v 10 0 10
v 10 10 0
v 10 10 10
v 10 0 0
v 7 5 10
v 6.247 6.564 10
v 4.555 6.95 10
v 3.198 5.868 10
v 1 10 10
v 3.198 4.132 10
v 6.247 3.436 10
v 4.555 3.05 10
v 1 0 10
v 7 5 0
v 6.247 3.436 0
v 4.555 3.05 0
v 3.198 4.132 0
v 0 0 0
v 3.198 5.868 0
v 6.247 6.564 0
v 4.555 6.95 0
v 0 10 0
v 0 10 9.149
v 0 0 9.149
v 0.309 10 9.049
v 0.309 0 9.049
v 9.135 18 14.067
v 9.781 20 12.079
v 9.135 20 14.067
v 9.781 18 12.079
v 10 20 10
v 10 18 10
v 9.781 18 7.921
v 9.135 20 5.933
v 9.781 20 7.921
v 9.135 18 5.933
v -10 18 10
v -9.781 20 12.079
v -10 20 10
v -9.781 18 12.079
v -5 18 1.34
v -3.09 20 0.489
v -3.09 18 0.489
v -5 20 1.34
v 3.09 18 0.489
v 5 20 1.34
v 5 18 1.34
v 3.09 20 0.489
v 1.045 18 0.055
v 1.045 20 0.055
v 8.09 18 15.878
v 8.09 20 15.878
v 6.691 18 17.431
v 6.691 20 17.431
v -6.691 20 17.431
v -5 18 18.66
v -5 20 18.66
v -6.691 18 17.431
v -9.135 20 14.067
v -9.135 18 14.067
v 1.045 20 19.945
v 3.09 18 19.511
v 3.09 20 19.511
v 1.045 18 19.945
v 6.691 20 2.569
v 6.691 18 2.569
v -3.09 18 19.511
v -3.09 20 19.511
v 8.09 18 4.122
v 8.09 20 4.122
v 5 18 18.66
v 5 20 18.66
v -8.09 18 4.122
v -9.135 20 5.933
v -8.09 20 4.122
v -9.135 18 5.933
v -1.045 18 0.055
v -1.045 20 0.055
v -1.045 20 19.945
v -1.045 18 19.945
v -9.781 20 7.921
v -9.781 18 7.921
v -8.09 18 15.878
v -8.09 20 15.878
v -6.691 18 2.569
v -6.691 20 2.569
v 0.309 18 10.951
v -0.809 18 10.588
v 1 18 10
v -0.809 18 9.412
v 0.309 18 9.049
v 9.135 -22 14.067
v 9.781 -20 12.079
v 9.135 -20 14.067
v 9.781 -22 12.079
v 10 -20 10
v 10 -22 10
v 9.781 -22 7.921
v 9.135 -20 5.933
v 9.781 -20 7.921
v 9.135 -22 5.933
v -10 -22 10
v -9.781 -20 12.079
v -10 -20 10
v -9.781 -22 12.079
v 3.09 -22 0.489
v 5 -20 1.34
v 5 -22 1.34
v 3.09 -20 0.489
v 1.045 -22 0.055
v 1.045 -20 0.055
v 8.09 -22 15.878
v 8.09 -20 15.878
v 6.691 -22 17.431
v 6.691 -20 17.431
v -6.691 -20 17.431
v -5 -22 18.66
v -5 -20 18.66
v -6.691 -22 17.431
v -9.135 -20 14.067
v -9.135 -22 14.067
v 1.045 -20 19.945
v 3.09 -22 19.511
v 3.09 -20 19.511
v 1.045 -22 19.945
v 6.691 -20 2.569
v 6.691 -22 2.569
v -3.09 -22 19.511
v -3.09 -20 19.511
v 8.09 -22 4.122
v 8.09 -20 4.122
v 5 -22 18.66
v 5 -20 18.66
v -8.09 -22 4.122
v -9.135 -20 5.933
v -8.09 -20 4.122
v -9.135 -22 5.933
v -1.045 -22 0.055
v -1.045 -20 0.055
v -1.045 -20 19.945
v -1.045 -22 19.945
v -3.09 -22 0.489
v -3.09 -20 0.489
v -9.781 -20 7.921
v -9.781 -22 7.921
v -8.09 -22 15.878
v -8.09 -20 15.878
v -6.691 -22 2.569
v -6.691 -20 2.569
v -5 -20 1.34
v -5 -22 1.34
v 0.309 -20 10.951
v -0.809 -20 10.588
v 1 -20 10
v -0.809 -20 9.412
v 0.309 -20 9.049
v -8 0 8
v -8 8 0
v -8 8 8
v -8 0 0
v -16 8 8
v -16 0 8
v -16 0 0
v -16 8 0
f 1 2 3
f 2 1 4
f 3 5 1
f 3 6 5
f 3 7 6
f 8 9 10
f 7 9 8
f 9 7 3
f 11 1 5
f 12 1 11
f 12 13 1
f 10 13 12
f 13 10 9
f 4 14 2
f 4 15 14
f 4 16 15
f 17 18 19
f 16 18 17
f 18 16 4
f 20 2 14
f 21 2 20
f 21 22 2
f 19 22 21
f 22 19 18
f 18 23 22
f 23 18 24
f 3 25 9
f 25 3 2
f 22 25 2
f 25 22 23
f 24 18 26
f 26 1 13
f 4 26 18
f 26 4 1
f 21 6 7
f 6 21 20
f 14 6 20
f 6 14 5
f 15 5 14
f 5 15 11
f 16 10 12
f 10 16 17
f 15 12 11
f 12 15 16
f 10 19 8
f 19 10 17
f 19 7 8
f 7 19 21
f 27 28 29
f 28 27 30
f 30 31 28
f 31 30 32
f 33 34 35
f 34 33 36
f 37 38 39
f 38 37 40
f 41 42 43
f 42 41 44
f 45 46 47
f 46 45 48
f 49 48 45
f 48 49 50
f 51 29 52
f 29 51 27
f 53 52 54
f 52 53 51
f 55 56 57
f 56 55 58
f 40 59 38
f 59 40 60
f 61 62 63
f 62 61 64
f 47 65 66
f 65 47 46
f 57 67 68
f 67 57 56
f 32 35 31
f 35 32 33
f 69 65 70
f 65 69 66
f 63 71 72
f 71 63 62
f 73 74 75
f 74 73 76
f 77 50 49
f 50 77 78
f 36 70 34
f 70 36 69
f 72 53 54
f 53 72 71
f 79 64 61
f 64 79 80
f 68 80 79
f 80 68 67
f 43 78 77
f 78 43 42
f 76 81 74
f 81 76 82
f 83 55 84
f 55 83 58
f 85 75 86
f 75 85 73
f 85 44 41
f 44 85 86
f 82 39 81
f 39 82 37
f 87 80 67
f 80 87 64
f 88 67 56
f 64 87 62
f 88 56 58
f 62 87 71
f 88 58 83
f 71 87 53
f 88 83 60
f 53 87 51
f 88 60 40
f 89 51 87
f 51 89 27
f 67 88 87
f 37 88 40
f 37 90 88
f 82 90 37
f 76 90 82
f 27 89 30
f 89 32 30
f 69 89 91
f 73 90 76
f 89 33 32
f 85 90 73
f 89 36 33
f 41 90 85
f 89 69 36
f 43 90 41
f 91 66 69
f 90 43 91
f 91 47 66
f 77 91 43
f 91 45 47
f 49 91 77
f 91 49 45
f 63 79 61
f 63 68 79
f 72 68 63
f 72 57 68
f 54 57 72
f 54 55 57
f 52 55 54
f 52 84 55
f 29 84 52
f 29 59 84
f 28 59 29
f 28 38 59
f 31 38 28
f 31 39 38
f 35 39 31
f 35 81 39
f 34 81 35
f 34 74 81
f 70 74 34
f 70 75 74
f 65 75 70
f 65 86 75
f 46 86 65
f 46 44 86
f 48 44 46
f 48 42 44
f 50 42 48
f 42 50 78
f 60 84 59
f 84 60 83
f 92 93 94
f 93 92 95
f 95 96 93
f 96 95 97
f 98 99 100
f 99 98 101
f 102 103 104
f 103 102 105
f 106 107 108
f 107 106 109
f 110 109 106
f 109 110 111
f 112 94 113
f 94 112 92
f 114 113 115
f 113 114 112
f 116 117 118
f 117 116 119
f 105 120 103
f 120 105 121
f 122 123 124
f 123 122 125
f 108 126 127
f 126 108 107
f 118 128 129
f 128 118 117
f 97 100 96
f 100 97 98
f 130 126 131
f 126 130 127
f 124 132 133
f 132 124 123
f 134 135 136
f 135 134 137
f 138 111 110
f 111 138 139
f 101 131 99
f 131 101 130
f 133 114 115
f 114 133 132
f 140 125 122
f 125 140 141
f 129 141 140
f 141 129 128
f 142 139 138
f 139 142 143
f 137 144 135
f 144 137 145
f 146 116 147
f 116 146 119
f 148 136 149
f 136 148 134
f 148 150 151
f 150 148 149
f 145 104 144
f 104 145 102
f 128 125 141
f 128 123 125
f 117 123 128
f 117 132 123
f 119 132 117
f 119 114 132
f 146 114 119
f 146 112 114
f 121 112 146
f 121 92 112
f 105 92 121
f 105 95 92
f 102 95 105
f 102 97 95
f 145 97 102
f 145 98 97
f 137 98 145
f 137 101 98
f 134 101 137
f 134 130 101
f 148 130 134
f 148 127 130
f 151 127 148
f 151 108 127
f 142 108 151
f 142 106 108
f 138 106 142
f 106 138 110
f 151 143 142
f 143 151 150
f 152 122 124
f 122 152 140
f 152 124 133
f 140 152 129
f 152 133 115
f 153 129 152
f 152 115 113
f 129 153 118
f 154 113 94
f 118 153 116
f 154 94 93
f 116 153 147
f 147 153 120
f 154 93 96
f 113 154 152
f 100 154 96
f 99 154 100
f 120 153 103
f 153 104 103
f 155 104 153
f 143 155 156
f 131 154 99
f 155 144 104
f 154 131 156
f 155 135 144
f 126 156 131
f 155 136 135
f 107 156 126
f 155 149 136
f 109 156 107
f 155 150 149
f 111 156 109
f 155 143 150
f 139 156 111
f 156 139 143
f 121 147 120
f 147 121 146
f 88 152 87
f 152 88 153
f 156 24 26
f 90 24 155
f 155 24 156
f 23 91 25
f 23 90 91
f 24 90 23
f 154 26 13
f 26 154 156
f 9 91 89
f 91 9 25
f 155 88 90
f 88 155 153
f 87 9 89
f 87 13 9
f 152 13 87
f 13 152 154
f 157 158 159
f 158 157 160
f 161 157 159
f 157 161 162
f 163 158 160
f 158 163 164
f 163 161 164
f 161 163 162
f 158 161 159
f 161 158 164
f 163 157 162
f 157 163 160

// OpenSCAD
/* Movement */

/*
translate([-20, -20, 0]) cube([40, 40, 5]);
translate([0, 0, 5]) cylinder(h = 40, r = 5, $fn = 50);
translate([0, 0, 45]) cylinder(h = 5, r1 = 5, r2 = 0, $fn = 50);
*/

difference() {
  cube(10);
  translate([5, 5, -1]) cylinder(h = 12, r = 2);
}

translate([0, 20, 10]) rotate([90, 0, 0]) cylinder(h = 2, r = 10);
translate([0, -20, 10]) rotate([90, 0, 0]) cylinder(h = 2, r = 10);
translate([0, -20, 10]) rotate([-90, 0, 0]) cylinder(h = 40, r = 1);

// auto = true resize all directions
resize([8, 0, 0], auto = true) {
  translate([-10, 0, 0]) cube(5);
}
